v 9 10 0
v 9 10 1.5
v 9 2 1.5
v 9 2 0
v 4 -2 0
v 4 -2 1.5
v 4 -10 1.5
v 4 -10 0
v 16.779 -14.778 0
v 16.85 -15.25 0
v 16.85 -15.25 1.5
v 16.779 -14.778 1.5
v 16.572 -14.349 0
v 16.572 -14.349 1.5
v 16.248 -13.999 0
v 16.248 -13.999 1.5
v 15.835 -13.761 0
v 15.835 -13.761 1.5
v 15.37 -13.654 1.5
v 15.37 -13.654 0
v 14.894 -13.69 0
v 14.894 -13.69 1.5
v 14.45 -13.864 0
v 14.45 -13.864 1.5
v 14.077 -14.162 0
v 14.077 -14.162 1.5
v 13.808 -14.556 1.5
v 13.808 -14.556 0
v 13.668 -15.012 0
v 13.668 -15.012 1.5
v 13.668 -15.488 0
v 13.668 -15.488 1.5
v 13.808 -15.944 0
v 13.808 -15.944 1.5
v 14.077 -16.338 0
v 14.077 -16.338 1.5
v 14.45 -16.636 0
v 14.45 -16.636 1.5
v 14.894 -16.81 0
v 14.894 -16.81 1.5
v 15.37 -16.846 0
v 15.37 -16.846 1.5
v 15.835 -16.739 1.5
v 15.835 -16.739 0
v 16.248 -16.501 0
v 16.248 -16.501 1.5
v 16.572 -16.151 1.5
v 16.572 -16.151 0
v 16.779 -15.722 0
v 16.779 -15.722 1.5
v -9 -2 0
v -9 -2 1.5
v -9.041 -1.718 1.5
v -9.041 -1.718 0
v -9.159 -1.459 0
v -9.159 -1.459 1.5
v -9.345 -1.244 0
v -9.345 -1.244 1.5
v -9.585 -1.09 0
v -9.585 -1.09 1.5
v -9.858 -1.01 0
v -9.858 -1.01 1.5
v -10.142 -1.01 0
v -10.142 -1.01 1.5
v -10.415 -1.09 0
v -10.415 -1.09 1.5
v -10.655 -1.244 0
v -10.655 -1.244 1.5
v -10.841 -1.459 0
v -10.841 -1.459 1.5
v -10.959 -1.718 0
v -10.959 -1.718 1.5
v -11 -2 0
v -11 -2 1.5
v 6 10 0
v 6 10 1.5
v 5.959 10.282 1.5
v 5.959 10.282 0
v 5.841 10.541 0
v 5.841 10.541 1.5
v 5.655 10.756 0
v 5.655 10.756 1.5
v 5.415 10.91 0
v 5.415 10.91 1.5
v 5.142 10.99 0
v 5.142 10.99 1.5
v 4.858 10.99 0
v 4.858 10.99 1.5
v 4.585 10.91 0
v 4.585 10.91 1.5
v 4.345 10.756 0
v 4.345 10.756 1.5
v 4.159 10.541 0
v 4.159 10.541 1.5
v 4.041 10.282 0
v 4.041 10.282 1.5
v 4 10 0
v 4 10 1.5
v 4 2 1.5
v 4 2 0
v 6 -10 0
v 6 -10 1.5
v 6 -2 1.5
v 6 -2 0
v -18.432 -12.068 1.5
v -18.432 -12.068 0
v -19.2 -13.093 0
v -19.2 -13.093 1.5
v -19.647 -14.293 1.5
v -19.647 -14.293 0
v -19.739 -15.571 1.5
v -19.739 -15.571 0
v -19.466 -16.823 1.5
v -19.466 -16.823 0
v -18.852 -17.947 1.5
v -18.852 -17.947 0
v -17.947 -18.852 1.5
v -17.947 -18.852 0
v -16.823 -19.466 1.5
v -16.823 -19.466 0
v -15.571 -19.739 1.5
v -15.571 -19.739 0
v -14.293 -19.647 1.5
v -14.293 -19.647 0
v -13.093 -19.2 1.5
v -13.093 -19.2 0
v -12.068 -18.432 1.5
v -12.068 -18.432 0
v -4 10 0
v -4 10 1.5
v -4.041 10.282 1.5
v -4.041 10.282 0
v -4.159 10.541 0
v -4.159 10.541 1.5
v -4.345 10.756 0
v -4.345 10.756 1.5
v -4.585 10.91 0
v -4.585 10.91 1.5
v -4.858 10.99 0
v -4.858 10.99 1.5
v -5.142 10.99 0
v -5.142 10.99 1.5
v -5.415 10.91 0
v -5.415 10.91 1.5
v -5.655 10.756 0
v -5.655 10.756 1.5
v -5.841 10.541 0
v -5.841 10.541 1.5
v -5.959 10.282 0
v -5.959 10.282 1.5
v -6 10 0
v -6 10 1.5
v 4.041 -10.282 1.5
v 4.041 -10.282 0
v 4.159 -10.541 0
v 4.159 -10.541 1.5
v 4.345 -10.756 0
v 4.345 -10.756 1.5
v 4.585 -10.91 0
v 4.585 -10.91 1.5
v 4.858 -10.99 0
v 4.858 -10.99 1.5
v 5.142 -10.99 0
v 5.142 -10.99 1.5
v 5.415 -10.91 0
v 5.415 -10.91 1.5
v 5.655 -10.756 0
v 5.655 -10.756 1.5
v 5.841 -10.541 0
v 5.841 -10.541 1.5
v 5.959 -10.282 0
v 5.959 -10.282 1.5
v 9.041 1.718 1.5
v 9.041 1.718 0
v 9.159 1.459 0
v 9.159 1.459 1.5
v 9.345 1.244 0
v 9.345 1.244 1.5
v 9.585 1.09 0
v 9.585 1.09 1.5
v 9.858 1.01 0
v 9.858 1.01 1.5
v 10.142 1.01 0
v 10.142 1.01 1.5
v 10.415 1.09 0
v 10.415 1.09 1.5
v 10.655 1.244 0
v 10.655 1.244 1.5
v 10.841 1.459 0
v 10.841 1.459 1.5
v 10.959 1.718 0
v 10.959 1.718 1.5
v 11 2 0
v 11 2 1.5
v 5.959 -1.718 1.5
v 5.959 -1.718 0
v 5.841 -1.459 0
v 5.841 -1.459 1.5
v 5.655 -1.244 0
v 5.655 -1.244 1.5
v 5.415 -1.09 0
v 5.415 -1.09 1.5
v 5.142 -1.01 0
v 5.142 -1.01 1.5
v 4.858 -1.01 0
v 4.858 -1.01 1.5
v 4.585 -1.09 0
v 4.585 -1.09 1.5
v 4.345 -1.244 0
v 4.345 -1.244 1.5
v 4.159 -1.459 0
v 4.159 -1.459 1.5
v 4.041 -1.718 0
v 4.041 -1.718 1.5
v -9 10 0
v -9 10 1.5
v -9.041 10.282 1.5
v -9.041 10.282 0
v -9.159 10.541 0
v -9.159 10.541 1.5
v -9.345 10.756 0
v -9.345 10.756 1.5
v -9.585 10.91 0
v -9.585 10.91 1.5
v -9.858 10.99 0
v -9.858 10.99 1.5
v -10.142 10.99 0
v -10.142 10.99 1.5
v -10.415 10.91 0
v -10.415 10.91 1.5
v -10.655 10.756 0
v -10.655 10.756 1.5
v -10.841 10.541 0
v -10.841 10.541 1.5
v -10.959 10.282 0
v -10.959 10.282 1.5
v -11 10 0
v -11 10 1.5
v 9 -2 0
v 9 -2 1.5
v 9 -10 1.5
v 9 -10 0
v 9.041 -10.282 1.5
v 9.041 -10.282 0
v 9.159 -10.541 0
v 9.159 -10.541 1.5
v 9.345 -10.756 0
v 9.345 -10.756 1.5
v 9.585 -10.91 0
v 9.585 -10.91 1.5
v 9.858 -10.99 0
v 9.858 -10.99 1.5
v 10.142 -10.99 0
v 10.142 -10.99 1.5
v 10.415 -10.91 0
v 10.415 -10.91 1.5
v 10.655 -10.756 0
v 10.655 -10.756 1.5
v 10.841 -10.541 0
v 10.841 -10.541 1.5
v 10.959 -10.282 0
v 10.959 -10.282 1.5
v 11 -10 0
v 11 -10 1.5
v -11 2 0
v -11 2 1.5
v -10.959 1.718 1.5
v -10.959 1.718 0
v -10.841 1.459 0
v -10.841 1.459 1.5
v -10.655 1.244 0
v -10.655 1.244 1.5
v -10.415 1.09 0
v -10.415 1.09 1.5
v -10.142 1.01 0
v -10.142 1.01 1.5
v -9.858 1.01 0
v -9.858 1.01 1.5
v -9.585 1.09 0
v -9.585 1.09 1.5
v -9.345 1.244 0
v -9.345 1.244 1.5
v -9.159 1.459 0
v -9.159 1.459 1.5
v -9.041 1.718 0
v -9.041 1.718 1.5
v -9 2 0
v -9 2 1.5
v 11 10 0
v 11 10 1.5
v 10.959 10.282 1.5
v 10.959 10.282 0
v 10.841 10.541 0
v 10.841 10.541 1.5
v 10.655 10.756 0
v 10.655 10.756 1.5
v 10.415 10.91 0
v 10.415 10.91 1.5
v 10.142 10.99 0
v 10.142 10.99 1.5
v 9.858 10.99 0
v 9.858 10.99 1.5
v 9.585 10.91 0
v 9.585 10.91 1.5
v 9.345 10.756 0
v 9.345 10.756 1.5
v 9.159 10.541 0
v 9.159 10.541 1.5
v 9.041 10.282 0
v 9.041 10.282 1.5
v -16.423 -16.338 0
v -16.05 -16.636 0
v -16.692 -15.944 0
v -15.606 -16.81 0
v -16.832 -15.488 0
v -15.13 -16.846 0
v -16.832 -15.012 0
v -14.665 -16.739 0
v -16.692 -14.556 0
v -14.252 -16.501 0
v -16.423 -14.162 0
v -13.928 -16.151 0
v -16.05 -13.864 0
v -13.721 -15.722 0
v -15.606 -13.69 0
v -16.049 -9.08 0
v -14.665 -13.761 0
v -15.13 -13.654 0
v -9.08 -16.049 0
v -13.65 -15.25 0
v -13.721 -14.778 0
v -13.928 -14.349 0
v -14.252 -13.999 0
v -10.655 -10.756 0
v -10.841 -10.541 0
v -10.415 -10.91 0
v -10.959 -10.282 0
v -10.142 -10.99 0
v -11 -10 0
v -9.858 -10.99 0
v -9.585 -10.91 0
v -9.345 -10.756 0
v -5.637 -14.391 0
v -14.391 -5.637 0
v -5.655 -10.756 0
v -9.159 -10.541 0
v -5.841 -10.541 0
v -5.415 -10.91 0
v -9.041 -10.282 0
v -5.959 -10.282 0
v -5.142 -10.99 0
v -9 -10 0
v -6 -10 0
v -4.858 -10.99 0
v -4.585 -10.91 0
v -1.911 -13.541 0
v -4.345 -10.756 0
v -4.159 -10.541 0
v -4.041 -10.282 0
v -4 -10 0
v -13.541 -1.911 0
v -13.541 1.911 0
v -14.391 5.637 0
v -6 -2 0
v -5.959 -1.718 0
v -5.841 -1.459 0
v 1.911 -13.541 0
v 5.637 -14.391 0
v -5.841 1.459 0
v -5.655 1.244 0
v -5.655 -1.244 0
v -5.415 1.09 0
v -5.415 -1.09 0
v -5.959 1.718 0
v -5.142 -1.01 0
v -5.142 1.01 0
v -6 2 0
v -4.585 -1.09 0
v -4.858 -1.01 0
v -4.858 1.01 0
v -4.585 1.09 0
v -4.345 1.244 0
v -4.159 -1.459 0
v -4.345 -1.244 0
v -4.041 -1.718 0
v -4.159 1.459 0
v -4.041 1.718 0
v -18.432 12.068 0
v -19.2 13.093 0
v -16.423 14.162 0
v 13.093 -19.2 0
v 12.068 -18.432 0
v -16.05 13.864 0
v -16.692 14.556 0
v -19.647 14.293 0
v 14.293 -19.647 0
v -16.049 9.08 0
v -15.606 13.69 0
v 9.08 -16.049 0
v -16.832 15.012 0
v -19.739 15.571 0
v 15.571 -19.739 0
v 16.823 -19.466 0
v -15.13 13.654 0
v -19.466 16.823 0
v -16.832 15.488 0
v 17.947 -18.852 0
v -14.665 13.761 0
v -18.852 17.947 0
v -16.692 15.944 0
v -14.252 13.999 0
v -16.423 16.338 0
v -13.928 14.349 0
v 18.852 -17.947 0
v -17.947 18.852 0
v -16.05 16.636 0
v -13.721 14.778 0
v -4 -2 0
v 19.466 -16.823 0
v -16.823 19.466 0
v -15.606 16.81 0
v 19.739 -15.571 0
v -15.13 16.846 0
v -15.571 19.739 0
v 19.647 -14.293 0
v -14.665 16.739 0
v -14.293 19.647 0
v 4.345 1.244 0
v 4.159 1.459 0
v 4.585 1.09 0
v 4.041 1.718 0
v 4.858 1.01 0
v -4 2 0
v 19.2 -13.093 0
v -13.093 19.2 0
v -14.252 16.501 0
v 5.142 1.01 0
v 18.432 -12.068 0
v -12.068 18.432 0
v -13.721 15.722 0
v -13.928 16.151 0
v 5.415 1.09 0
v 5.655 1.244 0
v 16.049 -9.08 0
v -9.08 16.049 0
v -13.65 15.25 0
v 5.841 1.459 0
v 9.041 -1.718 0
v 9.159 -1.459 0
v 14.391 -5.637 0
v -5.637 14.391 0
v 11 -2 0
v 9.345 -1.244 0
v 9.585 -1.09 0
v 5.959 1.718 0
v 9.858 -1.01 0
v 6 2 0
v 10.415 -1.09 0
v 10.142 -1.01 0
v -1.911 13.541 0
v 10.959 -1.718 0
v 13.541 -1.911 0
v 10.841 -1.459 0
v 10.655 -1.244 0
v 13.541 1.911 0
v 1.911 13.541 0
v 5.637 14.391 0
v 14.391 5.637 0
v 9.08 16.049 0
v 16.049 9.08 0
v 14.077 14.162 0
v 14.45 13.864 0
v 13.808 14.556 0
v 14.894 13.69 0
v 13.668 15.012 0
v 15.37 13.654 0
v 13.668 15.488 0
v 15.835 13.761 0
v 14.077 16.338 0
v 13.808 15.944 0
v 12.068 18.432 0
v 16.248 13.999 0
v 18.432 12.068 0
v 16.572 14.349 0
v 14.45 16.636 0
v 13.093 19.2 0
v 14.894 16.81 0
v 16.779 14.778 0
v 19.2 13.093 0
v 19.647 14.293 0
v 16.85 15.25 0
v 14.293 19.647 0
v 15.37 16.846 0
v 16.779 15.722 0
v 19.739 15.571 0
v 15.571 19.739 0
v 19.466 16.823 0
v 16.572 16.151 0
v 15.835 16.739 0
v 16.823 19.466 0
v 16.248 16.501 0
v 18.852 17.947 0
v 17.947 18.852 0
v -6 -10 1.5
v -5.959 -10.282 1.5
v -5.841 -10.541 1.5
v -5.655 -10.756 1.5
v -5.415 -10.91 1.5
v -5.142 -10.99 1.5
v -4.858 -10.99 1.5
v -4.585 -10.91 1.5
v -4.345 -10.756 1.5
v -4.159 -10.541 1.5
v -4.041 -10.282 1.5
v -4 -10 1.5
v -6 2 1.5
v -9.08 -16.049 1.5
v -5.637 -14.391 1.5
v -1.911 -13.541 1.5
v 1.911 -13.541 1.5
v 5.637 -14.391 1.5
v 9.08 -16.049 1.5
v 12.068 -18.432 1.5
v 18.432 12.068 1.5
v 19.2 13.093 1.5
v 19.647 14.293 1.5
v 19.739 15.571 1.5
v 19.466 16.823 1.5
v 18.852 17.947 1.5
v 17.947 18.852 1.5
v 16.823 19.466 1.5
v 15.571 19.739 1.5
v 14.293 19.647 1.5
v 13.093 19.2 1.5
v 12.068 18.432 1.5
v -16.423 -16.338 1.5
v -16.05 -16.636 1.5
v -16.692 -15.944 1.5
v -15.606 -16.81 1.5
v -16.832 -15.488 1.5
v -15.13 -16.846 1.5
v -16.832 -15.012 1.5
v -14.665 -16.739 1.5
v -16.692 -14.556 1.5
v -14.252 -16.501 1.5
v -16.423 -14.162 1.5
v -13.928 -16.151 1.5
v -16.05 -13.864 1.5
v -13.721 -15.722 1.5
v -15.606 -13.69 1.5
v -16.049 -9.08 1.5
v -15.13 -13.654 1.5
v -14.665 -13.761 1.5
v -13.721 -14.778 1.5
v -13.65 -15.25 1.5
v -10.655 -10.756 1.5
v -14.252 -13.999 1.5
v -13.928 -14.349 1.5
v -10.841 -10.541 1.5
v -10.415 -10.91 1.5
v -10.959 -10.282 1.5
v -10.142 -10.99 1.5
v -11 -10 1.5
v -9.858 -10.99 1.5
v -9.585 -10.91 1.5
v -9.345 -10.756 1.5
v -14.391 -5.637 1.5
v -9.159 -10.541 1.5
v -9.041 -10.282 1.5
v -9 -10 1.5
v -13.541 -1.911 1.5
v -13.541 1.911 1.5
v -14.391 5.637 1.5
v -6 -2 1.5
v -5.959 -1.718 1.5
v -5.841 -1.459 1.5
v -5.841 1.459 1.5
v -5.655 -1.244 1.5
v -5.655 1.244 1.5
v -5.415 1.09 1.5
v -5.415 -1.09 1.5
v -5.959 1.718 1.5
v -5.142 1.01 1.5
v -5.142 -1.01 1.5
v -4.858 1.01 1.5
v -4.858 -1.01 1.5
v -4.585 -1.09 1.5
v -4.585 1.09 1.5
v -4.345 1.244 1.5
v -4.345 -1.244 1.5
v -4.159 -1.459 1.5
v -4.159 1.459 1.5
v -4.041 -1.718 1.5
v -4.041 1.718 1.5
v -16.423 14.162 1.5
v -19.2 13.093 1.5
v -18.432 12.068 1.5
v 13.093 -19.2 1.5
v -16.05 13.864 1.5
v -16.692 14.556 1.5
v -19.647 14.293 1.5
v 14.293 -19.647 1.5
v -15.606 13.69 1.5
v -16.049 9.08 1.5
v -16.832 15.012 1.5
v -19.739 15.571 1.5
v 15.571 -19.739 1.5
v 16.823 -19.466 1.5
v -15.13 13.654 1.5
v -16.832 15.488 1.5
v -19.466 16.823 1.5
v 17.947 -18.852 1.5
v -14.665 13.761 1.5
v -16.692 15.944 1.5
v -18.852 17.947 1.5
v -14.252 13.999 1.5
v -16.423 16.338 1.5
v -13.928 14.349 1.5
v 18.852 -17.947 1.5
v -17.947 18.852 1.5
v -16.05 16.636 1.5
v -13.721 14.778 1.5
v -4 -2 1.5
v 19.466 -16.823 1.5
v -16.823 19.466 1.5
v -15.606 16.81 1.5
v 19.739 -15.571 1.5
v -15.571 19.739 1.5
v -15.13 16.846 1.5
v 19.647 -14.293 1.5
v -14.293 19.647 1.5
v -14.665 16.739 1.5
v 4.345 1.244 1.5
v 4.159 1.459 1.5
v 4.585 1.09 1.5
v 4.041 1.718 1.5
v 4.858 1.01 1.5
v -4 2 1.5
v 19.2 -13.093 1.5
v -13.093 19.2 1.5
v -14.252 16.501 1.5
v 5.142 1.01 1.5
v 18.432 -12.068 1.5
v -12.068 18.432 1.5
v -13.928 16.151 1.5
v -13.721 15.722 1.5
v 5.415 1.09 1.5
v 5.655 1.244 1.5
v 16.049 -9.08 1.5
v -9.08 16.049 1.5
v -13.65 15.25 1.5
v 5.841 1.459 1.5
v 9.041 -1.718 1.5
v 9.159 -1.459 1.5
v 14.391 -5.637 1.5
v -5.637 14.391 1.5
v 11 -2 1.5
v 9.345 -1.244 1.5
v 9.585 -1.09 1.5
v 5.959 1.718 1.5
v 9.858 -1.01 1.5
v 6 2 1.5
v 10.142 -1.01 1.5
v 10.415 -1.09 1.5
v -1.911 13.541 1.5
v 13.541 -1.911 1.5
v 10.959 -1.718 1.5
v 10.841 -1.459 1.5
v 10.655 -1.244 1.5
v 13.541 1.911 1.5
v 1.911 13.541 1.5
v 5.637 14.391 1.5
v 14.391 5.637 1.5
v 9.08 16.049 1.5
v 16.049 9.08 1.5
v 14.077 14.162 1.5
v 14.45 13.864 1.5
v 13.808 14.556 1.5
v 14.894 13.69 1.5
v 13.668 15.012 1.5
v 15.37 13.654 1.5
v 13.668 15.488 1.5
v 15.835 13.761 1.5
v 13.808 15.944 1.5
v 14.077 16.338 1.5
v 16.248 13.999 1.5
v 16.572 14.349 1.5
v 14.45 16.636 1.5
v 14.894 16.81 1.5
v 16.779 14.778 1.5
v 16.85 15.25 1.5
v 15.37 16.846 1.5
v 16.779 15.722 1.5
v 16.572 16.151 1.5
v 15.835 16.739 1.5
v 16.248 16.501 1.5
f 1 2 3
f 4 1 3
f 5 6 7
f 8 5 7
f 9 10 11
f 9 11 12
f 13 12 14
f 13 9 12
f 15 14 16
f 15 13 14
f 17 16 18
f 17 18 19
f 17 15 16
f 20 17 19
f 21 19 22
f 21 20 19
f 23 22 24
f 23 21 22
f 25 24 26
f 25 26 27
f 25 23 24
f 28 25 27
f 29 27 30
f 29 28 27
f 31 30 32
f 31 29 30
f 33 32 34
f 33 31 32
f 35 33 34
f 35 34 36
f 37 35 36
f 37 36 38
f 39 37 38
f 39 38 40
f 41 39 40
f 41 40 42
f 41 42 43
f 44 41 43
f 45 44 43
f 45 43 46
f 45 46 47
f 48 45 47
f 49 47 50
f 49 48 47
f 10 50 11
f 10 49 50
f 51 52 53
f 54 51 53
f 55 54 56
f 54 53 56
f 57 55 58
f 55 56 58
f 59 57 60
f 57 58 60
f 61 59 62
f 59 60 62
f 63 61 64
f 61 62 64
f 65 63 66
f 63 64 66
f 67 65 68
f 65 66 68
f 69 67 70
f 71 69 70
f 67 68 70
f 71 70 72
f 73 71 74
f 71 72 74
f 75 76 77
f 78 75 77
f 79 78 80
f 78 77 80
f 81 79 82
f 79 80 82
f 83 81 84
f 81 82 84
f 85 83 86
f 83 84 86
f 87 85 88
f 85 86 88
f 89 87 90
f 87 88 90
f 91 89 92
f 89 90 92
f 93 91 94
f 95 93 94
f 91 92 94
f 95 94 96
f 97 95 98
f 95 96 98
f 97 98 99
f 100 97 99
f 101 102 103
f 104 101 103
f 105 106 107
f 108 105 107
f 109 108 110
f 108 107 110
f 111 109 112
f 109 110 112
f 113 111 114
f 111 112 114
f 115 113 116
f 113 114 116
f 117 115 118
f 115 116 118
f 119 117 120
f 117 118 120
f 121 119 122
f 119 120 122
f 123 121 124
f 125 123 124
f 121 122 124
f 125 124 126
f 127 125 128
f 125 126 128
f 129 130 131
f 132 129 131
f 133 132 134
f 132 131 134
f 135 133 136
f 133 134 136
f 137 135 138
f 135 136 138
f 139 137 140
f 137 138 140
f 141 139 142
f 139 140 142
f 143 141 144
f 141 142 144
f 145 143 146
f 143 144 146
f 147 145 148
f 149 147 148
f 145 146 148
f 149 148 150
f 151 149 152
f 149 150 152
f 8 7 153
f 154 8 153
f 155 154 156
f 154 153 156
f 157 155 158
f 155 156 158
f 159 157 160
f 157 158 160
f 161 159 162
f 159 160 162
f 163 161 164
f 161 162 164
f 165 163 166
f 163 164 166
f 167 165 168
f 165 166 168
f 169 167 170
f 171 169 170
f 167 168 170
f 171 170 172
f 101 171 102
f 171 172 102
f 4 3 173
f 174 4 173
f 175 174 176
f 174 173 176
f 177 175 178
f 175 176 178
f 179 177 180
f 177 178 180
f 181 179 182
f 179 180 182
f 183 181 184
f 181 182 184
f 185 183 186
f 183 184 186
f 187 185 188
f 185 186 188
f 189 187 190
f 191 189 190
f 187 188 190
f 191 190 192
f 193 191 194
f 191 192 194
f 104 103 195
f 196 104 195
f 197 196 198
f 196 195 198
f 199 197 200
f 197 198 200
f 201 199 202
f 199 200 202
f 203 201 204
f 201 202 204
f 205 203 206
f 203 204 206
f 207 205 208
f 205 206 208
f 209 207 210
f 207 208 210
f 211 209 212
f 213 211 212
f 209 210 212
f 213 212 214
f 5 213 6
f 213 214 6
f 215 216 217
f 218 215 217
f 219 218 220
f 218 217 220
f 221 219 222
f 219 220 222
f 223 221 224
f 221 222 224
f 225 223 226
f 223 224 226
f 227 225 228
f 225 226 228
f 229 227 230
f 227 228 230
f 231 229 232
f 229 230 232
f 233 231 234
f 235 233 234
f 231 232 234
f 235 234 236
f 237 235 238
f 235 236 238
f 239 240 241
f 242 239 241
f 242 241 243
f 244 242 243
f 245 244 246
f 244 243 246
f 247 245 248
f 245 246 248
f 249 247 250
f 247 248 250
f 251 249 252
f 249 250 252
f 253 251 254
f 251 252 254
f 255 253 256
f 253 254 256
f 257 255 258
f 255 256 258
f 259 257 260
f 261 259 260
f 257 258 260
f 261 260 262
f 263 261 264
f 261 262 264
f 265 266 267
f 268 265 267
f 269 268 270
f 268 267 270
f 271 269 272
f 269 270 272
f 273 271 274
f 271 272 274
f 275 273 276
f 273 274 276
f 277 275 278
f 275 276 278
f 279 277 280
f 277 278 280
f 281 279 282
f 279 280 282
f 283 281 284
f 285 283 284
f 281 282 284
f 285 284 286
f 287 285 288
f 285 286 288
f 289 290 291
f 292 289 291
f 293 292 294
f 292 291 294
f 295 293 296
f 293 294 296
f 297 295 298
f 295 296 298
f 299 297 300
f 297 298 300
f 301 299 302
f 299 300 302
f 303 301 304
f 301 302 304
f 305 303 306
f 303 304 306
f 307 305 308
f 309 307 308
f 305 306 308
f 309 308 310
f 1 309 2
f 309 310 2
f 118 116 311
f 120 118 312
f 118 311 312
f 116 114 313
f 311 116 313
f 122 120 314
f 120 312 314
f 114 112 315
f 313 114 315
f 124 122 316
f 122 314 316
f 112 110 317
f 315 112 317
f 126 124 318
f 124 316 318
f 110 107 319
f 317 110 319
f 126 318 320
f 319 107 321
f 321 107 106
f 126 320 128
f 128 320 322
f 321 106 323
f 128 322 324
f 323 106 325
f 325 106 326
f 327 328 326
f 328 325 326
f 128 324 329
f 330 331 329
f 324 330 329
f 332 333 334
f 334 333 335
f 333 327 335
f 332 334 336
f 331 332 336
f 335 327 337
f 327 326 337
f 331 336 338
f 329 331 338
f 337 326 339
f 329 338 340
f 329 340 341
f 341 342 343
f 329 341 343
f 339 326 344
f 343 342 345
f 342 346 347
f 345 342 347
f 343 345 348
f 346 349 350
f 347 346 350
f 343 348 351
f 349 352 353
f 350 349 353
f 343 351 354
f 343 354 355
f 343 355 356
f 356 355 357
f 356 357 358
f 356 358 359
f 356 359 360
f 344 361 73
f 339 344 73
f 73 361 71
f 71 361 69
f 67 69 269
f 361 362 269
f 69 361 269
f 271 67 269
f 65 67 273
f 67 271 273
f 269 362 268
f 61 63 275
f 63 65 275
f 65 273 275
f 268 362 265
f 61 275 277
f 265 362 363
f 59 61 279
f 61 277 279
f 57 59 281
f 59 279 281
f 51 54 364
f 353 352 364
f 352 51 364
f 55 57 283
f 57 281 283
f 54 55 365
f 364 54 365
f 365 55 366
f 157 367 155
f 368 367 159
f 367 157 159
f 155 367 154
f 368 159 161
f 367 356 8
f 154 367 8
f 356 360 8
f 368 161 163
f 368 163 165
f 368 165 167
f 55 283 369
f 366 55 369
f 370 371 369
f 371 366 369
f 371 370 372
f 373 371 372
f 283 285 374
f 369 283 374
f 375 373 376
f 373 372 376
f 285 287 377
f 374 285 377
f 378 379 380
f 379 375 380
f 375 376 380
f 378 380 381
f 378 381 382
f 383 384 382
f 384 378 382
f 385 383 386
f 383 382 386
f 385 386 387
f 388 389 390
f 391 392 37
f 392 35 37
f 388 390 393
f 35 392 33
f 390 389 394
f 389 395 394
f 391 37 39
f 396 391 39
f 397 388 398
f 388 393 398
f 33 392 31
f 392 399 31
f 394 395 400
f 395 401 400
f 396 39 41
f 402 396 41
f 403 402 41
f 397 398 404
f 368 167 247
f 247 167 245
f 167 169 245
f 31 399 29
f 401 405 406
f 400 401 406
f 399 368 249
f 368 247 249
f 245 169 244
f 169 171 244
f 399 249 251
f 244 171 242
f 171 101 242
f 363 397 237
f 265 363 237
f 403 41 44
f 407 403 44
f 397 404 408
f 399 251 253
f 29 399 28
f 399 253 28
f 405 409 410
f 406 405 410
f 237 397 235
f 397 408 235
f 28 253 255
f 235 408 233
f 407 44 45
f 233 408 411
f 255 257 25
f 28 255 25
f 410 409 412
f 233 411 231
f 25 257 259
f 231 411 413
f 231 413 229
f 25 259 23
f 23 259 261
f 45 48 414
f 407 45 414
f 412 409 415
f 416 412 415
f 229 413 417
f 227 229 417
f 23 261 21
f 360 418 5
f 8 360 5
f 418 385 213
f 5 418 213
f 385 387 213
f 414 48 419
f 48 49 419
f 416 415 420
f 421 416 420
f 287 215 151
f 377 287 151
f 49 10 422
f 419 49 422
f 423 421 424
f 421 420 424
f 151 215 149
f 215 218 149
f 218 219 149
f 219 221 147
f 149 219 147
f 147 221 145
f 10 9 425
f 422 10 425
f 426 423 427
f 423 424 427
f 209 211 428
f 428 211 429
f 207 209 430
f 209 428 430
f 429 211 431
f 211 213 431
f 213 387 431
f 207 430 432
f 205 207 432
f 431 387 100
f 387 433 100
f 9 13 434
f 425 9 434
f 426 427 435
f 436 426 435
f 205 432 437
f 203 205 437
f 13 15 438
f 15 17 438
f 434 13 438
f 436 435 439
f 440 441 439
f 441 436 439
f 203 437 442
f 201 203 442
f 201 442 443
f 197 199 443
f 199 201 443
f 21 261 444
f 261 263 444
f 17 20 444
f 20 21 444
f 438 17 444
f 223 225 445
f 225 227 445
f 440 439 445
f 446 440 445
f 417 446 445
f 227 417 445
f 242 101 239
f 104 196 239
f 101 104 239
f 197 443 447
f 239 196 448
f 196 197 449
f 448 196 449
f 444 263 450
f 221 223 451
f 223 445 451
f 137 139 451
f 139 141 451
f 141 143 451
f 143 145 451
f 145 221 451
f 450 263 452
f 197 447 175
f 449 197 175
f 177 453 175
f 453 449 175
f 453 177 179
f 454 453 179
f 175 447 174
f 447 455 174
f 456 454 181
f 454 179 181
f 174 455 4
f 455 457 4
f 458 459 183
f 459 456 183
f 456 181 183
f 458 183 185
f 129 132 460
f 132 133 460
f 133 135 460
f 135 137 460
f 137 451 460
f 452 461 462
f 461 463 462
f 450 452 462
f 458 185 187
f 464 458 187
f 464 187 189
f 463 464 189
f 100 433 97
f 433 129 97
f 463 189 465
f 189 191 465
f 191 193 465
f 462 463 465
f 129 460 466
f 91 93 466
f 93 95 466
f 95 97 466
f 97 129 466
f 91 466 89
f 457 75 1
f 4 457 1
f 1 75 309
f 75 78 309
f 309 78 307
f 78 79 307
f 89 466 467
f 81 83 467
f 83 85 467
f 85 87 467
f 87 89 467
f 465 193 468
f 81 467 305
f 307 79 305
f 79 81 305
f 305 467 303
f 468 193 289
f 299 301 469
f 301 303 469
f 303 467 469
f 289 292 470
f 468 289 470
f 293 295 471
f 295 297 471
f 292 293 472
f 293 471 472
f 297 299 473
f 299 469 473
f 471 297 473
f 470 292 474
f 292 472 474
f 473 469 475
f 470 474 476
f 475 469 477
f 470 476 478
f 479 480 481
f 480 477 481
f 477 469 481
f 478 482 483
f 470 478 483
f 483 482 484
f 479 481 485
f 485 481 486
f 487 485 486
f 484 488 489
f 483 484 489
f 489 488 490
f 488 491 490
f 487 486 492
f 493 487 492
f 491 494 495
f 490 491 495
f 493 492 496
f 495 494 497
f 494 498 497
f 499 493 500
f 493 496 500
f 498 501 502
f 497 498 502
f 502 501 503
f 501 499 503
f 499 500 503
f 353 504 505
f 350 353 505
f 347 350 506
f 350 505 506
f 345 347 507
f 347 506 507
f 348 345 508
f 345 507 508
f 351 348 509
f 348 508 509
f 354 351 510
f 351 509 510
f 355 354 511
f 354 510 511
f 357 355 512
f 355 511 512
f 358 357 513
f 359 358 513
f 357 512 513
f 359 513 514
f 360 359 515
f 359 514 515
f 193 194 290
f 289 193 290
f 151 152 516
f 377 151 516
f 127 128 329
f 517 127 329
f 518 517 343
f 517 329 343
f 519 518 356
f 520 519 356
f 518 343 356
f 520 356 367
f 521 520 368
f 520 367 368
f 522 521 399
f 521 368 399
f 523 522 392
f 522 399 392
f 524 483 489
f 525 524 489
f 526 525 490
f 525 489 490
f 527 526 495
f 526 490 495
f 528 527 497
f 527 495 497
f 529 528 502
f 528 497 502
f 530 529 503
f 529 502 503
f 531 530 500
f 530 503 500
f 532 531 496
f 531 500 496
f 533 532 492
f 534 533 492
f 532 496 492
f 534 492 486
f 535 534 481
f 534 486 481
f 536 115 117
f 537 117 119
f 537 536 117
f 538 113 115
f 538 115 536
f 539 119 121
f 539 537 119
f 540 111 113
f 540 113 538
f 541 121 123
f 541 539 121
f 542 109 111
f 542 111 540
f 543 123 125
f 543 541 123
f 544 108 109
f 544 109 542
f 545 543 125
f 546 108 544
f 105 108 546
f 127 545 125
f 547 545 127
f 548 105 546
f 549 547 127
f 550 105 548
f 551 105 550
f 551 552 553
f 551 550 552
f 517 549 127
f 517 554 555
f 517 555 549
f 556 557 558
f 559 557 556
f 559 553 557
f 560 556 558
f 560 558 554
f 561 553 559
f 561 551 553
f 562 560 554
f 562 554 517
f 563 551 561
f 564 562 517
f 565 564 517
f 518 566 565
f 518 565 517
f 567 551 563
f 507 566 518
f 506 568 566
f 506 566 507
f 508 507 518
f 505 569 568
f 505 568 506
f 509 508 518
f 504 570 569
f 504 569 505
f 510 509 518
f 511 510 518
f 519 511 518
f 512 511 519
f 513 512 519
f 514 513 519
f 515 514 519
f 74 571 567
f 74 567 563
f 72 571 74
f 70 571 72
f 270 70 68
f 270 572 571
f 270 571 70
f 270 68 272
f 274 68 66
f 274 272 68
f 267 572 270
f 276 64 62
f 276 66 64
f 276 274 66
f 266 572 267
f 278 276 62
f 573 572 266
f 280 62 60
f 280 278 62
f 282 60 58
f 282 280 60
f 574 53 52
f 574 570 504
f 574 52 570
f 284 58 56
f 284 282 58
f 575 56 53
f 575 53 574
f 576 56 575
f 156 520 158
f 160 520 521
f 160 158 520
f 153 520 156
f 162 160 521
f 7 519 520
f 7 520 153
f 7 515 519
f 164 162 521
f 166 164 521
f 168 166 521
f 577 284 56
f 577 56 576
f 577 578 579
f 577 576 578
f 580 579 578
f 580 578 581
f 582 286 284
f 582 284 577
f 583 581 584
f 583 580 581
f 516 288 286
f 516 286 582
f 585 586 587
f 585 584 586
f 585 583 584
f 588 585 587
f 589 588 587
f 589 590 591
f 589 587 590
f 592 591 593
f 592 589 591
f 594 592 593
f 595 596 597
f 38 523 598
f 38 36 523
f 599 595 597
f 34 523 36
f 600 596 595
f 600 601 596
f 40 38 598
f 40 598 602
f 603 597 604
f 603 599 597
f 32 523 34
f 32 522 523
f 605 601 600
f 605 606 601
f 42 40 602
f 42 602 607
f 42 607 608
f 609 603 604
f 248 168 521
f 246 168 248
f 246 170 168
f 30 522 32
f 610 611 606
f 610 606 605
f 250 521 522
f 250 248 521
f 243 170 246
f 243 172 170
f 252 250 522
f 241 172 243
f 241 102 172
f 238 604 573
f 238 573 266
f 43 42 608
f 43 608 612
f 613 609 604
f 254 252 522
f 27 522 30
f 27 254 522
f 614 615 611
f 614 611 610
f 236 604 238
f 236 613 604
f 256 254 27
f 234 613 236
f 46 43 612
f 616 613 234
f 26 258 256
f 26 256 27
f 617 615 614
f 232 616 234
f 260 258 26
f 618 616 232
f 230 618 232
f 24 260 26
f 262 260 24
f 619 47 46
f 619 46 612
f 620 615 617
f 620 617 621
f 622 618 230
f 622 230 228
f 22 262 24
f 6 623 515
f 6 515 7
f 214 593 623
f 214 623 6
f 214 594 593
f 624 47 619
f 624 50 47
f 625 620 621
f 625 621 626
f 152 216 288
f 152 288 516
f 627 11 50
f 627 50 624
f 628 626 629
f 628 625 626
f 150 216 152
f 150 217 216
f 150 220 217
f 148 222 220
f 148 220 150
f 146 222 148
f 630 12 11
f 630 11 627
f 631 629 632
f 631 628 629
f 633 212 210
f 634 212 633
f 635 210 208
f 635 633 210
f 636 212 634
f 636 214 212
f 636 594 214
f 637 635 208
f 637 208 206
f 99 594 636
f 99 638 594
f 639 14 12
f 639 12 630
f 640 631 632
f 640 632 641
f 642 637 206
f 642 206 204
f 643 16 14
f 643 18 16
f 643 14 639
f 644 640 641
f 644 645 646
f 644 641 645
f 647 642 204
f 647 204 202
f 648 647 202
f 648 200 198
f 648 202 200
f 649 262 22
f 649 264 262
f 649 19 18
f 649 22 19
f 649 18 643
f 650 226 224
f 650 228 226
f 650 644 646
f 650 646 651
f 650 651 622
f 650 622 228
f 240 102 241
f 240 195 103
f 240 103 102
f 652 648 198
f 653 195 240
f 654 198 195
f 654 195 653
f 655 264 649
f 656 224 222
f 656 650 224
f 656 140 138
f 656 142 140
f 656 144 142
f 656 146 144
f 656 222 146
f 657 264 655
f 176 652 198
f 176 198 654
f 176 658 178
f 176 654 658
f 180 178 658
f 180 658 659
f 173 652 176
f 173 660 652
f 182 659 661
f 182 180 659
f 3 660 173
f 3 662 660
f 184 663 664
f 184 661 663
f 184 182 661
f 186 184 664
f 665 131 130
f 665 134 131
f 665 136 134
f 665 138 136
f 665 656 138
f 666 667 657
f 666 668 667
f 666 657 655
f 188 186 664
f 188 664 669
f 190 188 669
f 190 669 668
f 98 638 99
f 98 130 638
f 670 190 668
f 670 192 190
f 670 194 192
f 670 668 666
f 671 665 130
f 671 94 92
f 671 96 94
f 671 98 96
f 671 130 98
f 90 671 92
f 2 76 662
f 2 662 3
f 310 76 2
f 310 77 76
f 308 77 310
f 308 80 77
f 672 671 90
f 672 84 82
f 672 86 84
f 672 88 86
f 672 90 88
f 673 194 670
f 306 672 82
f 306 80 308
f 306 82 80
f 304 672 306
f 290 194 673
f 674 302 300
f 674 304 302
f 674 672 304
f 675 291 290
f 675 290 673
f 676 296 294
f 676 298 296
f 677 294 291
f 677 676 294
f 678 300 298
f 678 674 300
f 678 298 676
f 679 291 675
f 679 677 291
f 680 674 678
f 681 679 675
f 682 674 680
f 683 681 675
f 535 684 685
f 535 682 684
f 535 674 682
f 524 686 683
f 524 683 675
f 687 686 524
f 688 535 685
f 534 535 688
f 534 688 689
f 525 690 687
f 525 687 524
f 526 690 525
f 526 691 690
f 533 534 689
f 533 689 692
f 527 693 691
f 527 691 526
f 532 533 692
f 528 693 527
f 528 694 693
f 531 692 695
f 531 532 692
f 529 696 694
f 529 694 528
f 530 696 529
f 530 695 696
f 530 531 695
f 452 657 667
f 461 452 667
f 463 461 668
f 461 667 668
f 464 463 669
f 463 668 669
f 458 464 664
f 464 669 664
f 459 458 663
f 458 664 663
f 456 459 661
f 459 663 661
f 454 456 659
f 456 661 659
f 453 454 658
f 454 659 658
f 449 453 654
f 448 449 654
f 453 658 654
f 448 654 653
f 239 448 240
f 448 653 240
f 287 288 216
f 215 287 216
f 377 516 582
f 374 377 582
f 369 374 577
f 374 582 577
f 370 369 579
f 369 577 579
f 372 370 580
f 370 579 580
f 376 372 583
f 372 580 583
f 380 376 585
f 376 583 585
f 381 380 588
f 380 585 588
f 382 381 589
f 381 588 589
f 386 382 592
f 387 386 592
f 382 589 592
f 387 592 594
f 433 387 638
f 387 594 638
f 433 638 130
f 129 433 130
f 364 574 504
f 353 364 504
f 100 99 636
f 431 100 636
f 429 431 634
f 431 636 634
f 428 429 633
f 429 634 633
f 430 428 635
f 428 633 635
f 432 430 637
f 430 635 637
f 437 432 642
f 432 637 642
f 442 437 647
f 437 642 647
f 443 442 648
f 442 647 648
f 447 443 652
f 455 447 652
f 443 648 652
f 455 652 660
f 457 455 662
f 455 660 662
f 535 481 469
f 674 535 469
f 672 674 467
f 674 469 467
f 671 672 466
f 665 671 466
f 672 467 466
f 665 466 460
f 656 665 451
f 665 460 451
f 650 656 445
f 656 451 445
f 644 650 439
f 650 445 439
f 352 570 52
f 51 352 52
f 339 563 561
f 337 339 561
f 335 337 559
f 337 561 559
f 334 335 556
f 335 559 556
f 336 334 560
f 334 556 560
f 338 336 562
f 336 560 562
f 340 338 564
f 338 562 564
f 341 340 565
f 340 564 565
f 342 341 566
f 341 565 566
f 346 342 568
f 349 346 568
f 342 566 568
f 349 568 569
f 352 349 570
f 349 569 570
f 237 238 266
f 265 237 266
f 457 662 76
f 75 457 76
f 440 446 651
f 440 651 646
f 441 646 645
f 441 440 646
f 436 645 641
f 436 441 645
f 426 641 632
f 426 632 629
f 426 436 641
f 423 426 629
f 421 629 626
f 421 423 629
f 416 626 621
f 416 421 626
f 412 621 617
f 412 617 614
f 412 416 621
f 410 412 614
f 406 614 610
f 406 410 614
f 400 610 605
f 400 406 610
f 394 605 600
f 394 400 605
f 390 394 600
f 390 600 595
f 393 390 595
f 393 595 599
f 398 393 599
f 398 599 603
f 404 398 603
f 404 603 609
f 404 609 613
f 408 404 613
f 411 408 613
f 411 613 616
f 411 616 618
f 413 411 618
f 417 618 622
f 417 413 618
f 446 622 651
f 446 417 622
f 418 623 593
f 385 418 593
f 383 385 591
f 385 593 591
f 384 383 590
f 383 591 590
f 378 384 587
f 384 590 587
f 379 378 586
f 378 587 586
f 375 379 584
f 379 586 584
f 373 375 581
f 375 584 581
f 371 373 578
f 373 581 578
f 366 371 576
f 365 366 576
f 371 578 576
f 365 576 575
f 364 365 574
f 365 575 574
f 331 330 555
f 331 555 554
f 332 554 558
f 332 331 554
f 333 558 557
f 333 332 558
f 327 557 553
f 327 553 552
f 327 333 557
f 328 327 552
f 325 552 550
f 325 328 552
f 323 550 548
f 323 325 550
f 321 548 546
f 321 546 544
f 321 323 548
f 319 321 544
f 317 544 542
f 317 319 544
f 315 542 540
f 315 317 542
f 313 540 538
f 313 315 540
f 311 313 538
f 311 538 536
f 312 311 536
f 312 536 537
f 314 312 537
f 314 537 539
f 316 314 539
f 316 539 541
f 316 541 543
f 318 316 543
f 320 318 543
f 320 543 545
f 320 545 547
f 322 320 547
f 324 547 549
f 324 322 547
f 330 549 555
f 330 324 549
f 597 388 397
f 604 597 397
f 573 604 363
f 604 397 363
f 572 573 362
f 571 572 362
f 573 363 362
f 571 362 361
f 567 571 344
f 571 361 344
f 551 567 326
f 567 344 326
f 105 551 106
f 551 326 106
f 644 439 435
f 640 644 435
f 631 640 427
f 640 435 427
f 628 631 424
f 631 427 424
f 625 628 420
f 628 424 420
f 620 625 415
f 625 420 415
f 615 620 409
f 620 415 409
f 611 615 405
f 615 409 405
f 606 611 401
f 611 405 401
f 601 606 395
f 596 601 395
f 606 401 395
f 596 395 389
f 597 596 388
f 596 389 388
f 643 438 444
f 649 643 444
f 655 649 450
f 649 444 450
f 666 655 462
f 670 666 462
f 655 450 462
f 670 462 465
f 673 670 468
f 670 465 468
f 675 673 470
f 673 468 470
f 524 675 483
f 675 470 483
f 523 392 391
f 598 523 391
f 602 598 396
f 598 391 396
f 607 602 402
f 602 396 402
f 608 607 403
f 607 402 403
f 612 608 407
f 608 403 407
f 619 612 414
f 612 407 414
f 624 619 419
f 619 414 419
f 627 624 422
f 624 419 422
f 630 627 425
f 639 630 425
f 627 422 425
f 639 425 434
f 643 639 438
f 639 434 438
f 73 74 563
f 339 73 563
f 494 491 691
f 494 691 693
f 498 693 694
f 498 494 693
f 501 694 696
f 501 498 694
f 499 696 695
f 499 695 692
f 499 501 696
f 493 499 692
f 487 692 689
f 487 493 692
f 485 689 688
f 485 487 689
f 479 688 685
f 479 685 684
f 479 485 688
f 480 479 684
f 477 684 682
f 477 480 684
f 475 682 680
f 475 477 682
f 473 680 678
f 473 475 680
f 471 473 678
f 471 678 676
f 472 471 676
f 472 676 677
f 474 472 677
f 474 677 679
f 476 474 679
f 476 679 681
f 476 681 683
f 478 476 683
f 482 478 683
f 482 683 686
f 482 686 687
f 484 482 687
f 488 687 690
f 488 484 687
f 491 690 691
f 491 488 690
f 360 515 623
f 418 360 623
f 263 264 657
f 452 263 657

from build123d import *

# Parameters (mm, degrees)
F0_R     = 1.6
F1_DEPTH = 1.5
F3_DEPTH = 1.501


with BuildPart() as f1:
    # F0 (on Top) → F1 (new body)
    with BuildSketch(Plane.XY):
        with BuildLine():
            ThreePointArc((12.068019, 18.431981), (0, 13.433243), (-12.068019, 18.431981))
            ThreePointArc((-12.068019, 18.431981), (-18.431981, 18.431981), (-18.431981, 12.068019))
            ThreePointArc((-18.431981, 12.068019), (-13.433243, 0), (-18.431981, -12.068019))
            ThreePointArc((-18.431981, -12.068019), (-18.431981, -18.431981), (-12.068019, -18.431981))
            ThreePointArc((-12.068019, -18.431981), (0, -13.433243), (12.068019, -18.431981))
            ThreePointArc((12.068019, -18.431981), (18.431981, -18.431981), (18.431981, -12.068019))
            ThreePointArc((18.431981, -12.068019), (13.433243, 0), (18.431981, 12.068019))
            ThreePointArc((18.431981, 12.068019), (18.431981, 18.431981), (12.068019, 18.431981))
        make_face()
        with Locations((-15.25, -15.25)):
            Circle(F0_R, mode=Mode.SUBTRACT)
        with Locations((15.25, -15.25)):
            Circle(F0_R, mode=Mode.SUBTRACT)
        with Locations((-15.25, 15.25)):
            Circle(F0_R, mode=Mode.SUBTRACT)
        with Locations((15.25, 15.25)):
            Circle(F0_R, mode=Mode.SUBTRACT)
    extrude(amount=F1_DEPTH)

    # F2 (on face) → F3 (cut, through all)
    with BuildSketch(Plane.XY.offset(1.5)):
        with BuildLine():
            Line((-4, 2), (-4, 10))
            ThreePointArc((-4, 10), (-5, 11), (-6, 10))
            Line((-6, 10), (-6, 2))
            ThreePointArc((-6, 2), (-5, 1), (-4, 2))
        make_face()
        with BuildLine():
            ThreePointArc((6, 10), (5, 11), (4, 10))
            Line((4, 10), (4, 2))
            ThreePointArc((4, 2), (5, 1), (6, 2))
            Line((6, 2), (6, 10))
        make_face()
        with BuildLine():
            Line((-4, -10), (-4, -2))
            ThreePointArc((-4, -2), (-5, -1), (-6, -2))
            Line((-6, -2), (-6, -10))
            ThreePointArc((-6, -10), (-5, -11), (-4, -10))
        make_face()
        with BuildLine():
            ThreePointArc((6, -2), (5, -1), (4, -2))
            Line((4, -2), (4, -10))
            ThreePointArc((4, -10), (5, -11), (6, -10))
            Line((6, -10), (6, -2))
        make_face()
        with BuildLine():
            Line((-9, 2), (-9, 10))
            ThreePointArc((-9, 10), (-10, 11), (-11, 10))
            Line((-11, 10), (-11, 2))
            ThreePointArc((-11, 2), (-10, 1), (-9, 2))
        make_face()
        with BuildLine():
            Line((-9, -10), (-9, -2))
            ThreePointArc((-9, -2), (-10, -1), (-11, -2))
            Line((-11, -2), (-11, -10))
            ThreePointArc((-11, -10), (-10, -11), (-9, -10))
        make_face()
        with BuildLine():
            ThreePointArc((11, -2), (10, -1), (9, -2))
            Line((9, -2), (9, -10))
            ThreePointArc((9, -10), (10, -11), (11, -10))
            Line((11, -10), (11, -2))
        make_face()
        with BuildLine():
            Line((9, 10), (9, 2))
            ThreePointArc((9, 2), (10, 1), (11, 2))
            Line((11, 2), (11, 10))
            ThreePointArc((11, 10), (10, 11), (9, 10))
        make_face()
    extrude(amount=-F3_DEPTH, mode=Mode.SUBTRACT)


solid = f1.part
